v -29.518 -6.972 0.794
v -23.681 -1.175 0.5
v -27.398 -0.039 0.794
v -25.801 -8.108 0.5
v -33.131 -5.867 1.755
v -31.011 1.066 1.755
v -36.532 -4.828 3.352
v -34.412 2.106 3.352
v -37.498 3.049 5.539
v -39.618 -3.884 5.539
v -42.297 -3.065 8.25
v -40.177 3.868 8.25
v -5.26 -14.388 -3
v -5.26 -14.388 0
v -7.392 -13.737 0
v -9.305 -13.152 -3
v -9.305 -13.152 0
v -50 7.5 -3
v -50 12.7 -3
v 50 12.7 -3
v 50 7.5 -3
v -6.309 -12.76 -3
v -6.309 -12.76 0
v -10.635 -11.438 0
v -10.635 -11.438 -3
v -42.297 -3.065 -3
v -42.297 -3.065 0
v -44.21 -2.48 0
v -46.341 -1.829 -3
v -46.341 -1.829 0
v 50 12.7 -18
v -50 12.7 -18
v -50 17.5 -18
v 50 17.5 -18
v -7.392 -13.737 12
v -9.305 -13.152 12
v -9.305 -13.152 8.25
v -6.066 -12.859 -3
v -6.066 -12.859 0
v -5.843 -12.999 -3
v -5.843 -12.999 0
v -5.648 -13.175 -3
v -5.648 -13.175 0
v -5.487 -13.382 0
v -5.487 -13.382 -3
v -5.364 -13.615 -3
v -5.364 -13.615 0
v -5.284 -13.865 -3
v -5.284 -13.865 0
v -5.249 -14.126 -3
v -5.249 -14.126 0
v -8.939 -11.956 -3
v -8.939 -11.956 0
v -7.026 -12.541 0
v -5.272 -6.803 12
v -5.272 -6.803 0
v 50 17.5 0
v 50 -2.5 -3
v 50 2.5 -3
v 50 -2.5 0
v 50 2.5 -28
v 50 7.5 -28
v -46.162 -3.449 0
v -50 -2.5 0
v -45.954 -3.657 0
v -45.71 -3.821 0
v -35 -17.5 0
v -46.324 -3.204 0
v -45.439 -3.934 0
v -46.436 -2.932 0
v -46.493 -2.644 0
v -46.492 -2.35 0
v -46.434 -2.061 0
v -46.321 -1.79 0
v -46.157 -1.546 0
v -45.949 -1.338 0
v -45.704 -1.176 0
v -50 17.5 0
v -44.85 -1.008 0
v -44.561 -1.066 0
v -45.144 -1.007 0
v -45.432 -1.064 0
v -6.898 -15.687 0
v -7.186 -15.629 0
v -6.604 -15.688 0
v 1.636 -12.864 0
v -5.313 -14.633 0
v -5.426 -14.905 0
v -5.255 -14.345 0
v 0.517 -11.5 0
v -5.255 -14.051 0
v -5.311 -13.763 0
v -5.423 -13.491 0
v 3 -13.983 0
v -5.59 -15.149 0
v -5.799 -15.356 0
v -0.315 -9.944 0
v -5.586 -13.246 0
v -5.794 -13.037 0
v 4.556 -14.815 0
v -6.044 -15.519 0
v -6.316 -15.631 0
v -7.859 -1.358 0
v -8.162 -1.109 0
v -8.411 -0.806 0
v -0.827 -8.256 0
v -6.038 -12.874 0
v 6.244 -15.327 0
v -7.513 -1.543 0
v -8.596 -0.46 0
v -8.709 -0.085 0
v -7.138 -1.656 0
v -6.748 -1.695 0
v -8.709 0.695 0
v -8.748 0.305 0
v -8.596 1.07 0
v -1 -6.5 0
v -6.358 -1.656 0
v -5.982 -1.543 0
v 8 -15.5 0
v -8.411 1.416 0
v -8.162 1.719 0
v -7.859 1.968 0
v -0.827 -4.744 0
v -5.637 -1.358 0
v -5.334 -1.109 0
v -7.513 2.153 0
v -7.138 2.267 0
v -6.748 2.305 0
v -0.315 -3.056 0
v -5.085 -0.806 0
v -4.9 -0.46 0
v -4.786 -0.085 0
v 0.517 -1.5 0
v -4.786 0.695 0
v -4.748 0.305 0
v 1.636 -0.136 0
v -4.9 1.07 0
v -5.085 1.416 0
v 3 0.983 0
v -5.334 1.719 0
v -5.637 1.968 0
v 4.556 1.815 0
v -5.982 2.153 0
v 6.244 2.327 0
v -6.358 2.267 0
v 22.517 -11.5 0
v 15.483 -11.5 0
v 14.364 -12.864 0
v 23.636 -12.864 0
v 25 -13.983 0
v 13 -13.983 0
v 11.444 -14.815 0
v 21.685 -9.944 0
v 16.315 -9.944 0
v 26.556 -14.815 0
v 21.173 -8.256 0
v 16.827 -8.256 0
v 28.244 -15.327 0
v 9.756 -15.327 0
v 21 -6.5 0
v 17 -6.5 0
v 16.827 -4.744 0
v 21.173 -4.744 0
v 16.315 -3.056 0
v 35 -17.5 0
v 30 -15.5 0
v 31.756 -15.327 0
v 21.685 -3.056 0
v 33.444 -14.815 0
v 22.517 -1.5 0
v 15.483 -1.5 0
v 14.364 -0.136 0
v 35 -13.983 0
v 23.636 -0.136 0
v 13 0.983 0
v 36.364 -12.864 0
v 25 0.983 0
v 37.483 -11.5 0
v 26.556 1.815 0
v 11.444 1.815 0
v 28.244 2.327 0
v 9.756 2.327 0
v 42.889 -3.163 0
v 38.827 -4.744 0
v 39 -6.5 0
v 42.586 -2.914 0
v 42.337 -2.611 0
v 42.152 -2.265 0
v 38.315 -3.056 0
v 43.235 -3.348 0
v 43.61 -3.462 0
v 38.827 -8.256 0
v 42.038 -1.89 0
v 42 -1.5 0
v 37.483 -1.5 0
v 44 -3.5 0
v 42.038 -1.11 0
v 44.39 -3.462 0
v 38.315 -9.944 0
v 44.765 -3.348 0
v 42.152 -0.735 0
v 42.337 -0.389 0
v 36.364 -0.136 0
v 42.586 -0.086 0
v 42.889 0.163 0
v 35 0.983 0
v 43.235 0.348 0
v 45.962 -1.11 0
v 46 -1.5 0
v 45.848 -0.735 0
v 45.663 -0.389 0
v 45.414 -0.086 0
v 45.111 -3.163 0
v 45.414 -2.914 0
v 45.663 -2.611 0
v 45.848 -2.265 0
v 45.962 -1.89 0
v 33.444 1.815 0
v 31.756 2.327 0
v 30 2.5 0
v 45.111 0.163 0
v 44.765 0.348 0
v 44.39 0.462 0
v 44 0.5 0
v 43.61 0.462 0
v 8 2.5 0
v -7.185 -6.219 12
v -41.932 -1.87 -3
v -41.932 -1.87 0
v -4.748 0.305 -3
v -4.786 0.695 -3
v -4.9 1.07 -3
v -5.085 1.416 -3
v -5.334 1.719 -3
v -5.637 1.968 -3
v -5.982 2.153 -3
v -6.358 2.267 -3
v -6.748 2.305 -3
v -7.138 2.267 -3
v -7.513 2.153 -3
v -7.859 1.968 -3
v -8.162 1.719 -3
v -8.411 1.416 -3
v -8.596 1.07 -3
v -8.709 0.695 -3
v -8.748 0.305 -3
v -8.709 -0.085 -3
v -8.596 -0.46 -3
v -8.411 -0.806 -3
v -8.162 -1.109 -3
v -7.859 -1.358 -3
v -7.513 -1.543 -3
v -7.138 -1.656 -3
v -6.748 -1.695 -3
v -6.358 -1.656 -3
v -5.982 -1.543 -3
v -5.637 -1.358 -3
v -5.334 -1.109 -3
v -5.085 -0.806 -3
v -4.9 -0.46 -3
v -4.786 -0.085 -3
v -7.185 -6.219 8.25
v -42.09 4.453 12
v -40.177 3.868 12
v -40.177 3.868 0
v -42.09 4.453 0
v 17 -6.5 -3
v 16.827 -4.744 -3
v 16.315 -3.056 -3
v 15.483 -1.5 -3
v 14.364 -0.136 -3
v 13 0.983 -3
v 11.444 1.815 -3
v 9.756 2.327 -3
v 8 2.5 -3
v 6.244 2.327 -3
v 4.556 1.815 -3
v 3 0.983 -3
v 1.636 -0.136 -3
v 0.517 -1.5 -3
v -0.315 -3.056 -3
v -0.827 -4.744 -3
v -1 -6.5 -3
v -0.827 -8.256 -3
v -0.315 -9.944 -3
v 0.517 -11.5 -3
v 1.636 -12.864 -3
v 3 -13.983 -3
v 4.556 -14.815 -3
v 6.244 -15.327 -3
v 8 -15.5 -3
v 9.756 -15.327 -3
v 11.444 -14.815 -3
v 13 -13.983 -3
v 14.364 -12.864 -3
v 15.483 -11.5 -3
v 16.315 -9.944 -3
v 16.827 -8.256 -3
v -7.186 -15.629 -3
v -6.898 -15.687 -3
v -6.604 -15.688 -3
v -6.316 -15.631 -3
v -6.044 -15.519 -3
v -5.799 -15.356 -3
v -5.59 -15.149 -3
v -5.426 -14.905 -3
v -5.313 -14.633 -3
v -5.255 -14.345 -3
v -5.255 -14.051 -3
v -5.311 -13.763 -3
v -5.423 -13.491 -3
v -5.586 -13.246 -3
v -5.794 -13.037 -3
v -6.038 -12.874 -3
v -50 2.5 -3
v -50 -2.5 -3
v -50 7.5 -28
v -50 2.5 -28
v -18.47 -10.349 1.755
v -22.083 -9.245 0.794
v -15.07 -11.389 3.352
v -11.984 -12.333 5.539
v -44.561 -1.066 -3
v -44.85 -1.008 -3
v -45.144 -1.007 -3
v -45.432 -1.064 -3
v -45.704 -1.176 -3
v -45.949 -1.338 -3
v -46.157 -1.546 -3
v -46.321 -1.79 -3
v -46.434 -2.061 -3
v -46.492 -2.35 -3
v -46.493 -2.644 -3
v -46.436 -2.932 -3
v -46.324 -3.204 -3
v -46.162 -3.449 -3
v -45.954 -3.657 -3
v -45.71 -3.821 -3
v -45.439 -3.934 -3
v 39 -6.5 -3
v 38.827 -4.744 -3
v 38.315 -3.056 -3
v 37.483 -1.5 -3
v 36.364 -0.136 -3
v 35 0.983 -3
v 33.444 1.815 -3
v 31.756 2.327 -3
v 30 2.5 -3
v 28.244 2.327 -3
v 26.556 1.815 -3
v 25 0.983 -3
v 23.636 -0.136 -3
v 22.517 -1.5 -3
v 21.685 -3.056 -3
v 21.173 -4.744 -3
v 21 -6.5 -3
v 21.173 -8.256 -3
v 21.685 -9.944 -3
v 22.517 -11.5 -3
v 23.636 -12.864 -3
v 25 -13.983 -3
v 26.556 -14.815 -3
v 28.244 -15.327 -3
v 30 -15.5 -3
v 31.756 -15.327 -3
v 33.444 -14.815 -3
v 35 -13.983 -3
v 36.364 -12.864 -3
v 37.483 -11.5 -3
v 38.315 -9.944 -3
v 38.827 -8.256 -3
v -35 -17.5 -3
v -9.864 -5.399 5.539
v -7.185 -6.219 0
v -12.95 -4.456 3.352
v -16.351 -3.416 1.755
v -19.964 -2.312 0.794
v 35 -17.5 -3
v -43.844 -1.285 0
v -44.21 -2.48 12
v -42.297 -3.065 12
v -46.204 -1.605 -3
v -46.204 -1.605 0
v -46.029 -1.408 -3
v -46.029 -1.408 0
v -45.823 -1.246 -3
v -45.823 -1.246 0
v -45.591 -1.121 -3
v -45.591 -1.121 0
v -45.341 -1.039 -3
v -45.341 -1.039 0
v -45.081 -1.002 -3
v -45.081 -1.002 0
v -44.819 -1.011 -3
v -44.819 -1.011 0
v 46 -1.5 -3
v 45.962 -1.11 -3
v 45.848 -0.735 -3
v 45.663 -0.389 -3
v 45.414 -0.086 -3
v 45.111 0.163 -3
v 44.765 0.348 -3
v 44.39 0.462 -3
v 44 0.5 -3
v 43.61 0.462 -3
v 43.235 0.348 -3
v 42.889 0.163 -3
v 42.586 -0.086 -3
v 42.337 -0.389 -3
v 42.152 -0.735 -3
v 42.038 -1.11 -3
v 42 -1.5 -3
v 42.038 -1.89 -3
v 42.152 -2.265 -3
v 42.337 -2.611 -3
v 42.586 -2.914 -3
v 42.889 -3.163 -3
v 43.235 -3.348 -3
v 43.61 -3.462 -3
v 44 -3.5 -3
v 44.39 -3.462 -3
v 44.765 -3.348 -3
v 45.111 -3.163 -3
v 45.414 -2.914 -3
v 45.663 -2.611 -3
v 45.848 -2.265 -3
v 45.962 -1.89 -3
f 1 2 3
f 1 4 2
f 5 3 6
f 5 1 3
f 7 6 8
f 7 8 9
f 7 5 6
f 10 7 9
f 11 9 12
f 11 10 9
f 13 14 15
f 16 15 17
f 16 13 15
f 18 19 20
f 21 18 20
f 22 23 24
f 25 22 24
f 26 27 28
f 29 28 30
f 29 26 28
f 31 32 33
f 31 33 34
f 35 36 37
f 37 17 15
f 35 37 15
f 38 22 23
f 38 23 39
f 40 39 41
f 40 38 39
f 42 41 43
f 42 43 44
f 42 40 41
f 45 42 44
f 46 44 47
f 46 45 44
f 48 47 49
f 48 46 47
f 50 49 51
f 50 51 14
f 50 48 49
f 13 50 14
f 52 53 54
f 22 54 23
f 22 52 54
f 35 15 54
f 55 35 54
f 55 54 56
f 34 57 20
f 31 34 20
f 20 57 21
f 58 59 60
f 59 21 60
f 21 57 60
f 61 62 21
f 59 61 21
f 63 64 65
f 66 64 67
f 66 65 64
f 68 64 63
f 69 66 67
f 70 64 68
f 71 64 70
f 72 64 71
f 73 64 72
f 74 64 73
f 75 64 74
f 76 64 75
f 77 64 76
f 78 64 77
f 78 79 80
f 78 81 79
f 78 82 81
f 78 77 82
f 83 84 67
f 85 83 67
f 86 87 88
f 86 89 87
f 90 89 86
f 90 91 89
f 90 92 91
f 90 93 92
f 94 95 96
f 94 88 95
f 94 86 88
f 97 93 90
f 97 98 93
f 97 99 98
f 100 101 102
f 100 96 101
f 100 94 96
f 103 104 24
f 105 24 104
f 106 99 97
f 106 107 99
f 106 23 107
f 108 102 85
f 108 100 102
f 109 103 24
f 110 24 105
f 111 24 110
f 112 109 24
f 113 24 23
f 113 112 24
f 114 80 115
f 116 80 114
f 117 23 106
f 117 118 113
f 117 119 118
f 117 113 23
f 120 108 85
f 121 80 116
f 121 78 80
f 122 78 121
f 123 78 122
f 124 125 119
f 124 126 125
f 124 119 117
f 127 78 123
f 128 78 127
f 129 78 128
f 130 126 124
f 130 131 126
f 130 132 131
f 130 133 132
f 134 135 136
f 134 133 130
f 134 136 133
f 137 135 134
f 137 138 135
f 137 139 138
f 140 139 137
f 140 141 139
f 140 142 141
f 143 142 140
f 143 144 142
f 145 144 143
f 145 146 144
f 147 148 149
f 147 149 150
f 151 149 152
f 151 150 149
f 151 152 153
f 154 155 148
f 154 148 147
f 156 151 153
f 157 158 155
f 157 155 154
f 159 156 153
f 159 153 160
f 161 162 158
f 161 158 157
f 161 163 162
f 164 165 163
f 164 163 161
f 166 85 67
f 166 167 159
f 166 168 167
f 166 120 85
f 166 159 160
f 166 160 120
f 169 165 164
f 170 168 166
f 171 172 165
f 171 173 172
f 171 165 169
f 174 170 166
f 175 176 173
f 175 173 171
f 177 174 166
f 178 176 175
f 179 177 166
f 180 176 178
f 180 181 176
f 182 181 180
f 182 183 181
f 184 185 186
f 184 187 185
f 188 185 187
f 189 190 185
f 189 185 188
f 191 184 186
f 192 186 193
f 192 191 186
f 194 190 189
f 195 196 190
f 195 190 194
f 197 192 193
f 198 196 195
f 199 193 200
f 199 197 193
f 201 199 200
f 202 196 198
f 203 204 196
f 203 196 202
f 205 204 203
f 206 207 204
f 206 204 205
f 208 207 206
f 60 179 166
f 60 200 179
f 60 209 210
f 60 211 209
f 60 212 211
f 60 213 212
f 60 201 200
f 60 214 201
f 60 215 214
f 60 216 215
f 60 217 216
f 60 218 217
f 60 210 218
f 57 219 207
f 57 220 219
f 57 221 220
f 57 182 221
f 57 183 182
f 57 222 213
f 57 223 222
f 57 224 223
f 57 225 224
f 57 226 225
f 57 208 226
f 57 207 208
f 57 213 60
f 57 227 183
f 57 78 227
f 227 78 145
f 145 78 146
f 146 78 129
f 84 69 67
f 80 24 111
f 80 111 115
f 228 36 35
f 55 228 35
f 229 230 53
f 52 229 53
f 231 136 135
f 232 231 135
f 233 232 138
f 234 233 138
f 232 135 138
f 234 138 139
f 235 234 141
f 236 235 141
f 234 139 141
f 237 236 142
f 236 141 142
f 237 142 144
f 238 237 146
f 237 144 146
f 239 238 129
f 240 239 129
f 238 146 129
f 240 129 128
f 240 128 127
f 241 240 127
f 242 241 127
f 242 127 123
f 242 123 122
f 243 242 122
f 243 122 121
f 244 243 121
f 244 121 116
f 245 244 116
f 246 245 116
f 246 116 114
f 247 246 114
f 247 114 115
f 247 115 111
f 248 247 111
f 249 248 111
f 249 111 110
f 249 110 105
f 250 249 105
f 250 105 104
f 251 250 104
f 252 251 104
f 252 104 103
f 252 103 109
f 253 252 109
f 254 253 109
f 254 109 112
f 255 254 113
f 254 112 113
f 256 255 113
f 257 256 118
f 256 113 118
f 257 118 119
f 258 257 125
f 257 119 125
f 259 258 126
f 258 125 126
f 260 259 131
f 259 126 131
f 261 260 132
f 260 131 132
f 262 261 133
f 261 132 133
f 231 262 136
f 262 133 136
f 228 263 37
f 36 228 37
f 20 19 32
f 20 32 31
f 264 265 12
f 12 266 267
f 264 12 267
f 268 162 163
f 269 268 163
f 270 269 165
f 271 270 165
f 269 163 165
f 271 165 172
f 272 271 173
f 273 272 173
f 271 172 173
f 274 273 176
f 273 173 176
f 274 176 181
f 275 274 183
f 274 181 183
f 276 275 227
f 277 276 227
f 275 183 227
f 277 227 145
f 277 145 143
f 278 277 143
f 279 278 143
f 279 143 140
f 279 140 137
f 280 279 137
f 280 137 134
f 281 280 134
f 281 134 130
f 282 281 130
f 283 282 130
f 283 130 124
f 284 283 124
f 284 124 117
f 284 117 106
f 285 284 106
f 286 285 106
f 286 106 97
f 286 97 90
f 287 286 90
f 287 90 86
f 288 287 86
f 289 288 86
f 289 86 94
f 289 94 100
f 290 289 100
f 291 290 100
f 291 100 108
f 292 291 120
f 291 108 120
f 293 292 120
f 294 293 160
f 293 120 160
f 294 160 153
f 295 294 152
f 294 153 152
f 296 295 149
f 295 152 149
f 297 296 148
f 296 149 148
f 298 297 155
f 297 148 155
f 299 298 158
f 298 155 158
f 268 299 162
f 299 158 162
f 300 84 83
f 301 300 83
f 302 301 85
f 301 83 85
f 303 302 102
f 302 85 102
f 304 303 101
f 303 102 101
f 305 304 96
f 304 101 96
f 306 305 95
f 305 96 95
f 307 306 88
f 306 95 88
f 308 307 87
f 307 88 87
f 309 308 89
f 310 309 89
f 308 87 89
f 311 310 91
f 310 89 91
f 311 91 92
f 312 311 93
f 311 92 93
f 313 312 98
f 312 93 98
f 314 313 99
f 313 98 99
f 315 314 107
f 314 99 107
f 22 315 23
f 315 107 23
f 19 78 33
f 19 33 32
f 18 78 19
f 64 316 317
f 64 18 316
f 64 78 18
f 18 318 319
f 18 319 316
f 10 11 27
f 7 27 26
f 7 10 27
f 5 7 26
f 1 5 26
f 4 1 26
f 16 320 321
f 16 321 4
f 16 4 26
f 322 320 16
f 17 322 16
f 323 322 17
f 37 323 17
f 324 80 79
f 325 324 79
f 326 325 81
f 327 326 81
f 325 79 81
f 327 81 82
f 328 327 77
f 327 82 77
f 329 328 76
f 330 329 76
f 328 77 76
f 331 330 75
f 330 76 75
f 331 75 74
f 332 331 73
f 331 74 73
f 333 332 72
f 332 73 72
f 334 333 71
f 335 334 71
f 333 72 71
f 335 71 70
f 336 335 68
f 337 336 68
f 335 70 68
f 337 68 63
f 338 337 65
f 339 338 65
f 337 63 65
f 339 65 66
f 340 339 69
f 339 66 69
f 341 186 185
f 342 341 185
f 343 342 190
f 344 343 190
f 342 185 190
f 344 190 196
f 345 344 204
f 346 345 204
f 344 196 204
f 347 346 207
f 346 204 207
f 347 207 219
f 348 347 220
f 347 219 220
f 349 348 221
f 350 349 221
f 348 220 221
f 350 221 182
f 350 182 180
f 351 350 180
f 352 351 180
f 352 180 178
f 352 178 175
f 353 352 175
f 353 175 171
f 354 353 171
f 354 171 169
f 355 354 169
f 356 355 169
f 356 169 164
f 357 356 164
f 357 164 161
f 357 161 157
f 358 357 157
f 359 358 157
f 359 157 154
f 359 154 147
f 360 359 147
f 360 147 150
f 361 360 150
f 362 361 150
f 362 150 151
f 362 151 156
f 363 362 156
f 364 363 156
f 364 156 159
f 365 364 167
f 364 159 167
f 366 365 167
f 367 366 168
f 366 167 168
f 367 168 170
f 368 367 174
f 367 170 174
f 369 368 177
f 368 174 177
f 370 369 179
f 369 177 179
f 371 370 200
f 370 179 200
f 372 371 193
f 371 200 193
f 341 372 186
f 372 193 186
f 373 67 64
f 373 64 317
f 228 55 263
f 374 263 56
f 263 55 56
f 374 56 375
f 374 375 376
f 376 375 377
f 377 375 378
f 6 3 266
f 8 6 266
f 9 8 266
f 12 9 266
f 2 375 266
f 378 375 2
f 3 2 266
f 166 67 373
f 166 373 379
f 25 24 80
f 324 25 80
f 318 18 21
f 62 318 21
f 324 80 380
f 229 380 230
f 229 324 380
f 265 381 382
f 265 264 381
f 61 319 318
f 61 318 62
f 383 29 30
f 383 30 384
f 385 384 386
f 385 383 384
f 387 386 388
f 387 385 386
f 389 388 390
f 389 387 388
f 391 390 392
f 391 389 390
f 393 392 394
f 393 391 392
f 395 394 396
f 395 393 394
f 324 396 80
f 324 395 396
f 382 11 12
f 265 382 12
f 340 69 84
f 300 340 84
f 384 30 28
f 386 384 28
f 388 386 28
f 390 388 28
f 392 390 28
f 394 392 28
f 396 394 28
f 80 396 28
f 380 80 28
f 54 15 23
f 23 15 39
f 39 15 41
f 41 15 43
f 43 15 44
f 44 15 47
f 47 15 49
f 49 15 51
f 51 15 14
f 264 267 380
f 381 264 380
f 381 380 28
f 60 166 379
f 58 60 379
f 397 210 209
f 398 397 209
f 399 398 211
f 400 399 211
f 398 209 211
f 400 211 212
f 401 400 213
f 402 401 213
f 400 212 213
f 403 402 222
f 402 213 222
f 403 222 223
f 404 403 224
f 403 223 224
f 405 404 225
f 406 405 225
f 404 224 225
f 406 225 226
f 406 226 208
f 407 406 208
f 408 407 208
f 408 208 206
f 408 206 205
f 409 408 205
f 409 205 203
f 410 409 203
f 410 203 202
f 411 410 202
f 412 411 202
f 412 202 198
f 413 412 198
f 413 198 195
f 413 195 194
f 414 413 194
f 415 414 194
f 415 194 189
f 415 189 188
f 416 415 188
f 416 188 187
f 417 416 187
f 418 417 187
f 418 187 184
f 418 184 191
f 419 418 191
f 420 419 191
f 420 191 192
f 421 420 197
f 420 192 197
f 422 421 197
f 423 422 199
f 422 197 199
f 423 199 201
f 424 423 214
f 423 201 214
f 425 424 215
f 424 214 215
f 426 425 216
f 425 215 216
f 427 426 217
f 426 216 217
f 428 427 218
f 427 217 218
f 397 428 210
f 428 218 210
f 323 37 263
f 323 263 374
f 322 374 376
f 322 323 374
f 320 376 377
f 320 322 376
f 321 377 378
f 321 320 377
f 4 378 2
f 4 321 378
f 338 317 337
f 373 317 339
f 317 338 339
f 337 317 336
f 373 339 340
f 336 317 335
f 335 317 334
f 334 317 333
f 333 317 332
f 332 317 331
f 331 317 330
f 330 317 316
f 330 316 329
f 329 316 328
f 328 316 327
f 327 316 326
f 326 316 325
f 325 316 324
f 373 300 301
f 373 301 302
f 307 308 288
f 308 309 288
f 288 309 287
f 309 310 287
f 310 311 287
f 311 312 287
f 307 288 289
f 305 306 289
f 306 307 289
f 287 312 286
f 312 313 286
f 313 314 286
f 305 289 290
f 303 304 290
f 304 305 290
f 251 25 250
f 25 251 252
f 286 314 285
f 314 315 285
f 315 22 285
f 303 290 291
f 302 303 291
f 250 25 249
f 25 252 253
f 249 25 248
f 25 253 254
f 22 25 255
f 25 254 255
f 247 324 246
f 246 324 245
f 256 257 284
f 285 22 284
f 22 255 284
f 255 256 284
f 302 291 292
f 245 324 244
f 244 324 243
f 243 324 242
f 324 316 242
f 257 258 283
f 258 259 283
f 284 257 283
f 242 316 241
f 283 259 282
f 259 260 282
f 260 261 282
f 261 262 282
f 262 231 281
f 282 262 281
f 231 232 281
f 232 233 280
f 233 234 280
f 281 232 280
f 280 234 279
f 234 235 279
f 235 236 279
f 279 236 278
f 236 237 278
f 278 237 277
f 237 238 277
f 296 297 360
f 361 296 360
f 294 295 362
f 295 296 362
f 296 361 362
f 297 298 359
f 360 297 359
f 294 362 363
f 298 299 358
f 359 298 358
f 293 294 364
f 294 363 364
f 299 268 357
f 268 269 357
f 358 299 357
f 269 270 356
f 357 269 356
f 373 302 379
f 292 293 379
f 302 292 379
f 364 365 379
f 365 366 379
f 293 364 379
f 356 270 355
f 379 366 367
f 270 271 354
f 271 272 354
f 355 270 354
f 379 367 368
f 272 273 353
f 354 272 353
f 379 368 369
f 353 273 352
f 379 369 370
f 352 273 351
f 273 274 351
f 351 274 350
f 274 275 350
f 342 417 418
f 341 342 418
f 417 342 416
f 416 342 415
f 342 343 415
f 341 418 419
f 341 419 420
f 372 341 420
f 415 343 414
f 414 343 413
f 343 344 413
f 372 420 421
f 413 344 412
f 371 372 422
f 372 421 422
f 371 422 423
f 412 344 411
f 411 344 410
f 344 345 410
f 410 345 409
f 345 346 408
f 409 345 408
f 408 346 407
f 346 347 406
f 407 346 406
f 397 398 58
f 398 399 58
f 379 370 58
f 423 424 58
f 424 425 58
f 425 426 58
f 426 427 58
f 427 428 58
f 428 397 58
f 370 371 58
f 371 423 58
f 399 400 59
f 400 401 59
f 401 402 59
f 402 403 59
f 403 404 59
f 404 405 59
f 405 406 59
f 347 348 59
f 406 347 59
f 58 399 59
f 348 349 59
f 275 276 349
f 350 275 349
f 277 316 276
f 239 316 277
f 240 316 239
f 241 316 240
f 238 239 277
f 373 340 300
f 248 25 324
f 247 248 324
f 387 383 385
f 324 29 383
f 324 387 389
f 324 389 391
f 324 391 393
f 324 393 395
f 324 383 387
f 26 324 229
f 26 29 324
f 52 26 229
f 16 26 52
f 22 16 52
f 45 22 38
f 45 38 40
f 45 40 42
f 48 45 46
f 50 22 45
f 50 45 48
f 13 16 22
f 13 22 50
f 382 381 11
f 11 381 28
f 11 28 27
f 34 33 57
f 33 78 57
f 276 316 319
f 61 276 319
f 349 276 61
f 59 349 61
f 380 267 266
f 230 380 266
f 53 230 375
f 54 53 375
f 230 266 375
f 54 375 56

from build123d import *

# Parameters (mm, degrees)
F0_W      = 100
F0_H      = 35
F1_DEPTH  = 3
F2_W      = 100
F2_H      = 5
F3_DEPTH  = 25
F2_H_2    = 4.8
F4_DEPTH  = 15
F5_SIZE   = 15
F6_R      = 9
F6_R_2    = 2
F7_DEPTH  = 30
F9_DEPTH  = 1.25
F10_DEPTH = 6
F12_DEPTH = 3
F14_DEPTH = 12


with BuildPart() as f1:
    # F0 (on Top) → F1 (new body)
    with BuildSketch(Plane.XY):
        Rectangle(F0_W, F0_H)
    extrude(amount=-F1_DEPTH)

    # F2 (on face) → F3 (join)
    with BuildSketch(Plane(origin=(0, 0, -3), x_dir=(1, 0, 0), z_dir=(0, 0, -1))):
        with Locations((0, -5)):
            Rectangle(F2_W, F2_H)
    extrude(amount=F3_DEPTH)

    # F2 (on face) → F4 (join)
    with BuildSketch(Plane(origin=(0, 0, -3), x_dir=(1, 0, 0), z_dir=(0, 0, -1))):
        with Locations((0, -15.1)):
            Rectangle(F2_W, F2_H_2)
    extrude(amount=F4_DEPTH)

    # F5
    f5_edges = [f1.edges().sort_by_distance(p)[0] for p in [
        (50, -17.5, -1.5),
        (-50, -17.5, -1.5),
    ]]
    chamfer(f5_edges, length=F5_SIZE)

    # F6 (on face) → F7 (cut)
    with BuildSketch(Plane.XY):
        with BuildLine():
            Line((-45.4385575571, -3.9344571339), (-7.1863673186, -15.6293253229))
            ThreePointArc((-7.1863673186, -15.6293253229), (-5.3133526275, -14.633425746), (-6.3092522044, -12.760411055))
            Line((-6.3092522044, -12.760411055), (-10.635357075, -11.4377880648))
            Line((-10.635357075, -11.4377880648), (-44.5614424429, -1.0655428661))
            ThreePointArc((-44.5614424429, -1.0655428661), (-46.4344571339, -2.0614424429), (-45.4385575571, -3.9344571339))
        make_face()
        with Locations((30, -6.5)):
            Circle(F6_R)
        with Locations((8, -6.5)):
            Circle(F6_R)
        with Locations((-6.7478097615, 0.3051318111)):
            Circle(F6_R_2)
        with Locations((44, -1.5)):
            Circle(F6_R_2)
    extrude(amount=-F7_DEPTH, mode=Mode.SUBTRACT)


with BuildPart() as f9:
    # F8 (on face) → F9 (new body)
    with BuildSketch(Plane(origin=(-4.1070881898, -13.4336801598, 0), x_dir=(0.956304756, -0.2923717047, 0), z_dir=(-0.2923717047, -0.956304756, 0))):
        Polygon((-5.0527847565, 0), (-22.3027847565, 0), (-39.5527847565, 0), (-39.5527847565, -3), (-5.0527847565, -3), align=None)
        with BuildLine():
            Line((-39.5527847565, 0), (-22.3027847565, 0))
            Line((-22.3027847565, 0), (-5.0527847565, 0))
            Line((-5.0527847565, 0), (-5.0527847565, 8.25))
            ThreePointArc((-5.0527847565, 8.25), (-12.8248807082, 2.4766006665), (-22.3027847565, 0.5))
            ThreePointArc((-22.3027847565, 0.5), (-31.7806888049, 2.4766006665), (-39.5527847565, 8.25))
            Line((-39.5527847565, 8.25), (-39.5527847565, 0))
        make_face()
    extrude(amount=F9_DEPTH)

    # F8 (on face) → F10 (join)
    with BuildSketch(Plane(origin=(-4.1070881898, -13.4336801598, 0), x_dir=(0.956304756, -0.2923717047, 0), z_dir=(-0.2923717047, -0.956304756, 0))):
        with BuildLine():
            Line((-39.5527847565, 0), (-22.3027847565, 0))
            Line((-22.3027847565, 0), (-5.0527847565, 0))
            Line((-5.0527847565, 0), (-5.0527847565, 8.25))
            ThreePointArc((-5.0527847565, 8.25), (-12.8248807082, 2.4766006665), (-22.3027847565, 0.5))
            ThreePointArc((-22.3027847565, 0.5), (-31.7806888049, 2.4766006665), (-39.5527847565, 8.25))
            Line((-39.5527847565, 8.25), (-39.5527847565, 0))
        make_face()
    extrude(amount=-F10_DEPTH)

    # F11 (on face) → F12 (join, through all)
    with BuildSketch(Plane(origin=(0, 0, -3), x_dir=(1, 0, 0), z_dir=(0, 0, -1))):
        with BuildLine():
            ThreePointArc((-46.3413008821, 1.8285002281), (-45.5909842314, 1.1213275813), (-44.5614424429, 1.0655428661))
            Line((-44.5614424429, 1.0655428661), (-41.931604364, 1.869565054))
            Line((-41.931604364, 1.869565054), (-42.2970689949, 3.064945999))
            Line((-42.2970689949, 3.064945999), (-46.3413008821, 1.8285002281))
        make_face()
        with BuildLine():
            Line((-9.3045549142, 13.1517698119), (-8.9390902833, 11.956388867))
            Line((-8.9390902833, 11.956388867), (-6.3092522044, 12.760411055))
            ThreePointArc((-6.3092522044, 12.760411055), (-5.4869177961, 13.3823711418), (-5.260323027, 14.3882155828))
            Line((-5.260323027, 14.3882155828), (-9.3045549142, 13.1517698119))
        make_face()
    extrude(amount=-F12_DEPTH)

    # F13 (on face) → F14 (join)
    with BuildSketch(Plane.XY):
        Polygon((-7.184860055, -6.2185603312), (-9.3045549142, -13.1517698119), (-7.3919454023, -13.7365132214), (-5.272250543, -6.8033037406), align=None)
        Polygon((-44.2096785068, -2.4802025896), (-42.2970689949, -3.064945999), (-40.1773741357, 3.8682634817), (-42.0899836476, 4.4530068912), align=None)
    extrude(amount=F14_DEPTH)


solid = Compound([f1.part, f9.part])
